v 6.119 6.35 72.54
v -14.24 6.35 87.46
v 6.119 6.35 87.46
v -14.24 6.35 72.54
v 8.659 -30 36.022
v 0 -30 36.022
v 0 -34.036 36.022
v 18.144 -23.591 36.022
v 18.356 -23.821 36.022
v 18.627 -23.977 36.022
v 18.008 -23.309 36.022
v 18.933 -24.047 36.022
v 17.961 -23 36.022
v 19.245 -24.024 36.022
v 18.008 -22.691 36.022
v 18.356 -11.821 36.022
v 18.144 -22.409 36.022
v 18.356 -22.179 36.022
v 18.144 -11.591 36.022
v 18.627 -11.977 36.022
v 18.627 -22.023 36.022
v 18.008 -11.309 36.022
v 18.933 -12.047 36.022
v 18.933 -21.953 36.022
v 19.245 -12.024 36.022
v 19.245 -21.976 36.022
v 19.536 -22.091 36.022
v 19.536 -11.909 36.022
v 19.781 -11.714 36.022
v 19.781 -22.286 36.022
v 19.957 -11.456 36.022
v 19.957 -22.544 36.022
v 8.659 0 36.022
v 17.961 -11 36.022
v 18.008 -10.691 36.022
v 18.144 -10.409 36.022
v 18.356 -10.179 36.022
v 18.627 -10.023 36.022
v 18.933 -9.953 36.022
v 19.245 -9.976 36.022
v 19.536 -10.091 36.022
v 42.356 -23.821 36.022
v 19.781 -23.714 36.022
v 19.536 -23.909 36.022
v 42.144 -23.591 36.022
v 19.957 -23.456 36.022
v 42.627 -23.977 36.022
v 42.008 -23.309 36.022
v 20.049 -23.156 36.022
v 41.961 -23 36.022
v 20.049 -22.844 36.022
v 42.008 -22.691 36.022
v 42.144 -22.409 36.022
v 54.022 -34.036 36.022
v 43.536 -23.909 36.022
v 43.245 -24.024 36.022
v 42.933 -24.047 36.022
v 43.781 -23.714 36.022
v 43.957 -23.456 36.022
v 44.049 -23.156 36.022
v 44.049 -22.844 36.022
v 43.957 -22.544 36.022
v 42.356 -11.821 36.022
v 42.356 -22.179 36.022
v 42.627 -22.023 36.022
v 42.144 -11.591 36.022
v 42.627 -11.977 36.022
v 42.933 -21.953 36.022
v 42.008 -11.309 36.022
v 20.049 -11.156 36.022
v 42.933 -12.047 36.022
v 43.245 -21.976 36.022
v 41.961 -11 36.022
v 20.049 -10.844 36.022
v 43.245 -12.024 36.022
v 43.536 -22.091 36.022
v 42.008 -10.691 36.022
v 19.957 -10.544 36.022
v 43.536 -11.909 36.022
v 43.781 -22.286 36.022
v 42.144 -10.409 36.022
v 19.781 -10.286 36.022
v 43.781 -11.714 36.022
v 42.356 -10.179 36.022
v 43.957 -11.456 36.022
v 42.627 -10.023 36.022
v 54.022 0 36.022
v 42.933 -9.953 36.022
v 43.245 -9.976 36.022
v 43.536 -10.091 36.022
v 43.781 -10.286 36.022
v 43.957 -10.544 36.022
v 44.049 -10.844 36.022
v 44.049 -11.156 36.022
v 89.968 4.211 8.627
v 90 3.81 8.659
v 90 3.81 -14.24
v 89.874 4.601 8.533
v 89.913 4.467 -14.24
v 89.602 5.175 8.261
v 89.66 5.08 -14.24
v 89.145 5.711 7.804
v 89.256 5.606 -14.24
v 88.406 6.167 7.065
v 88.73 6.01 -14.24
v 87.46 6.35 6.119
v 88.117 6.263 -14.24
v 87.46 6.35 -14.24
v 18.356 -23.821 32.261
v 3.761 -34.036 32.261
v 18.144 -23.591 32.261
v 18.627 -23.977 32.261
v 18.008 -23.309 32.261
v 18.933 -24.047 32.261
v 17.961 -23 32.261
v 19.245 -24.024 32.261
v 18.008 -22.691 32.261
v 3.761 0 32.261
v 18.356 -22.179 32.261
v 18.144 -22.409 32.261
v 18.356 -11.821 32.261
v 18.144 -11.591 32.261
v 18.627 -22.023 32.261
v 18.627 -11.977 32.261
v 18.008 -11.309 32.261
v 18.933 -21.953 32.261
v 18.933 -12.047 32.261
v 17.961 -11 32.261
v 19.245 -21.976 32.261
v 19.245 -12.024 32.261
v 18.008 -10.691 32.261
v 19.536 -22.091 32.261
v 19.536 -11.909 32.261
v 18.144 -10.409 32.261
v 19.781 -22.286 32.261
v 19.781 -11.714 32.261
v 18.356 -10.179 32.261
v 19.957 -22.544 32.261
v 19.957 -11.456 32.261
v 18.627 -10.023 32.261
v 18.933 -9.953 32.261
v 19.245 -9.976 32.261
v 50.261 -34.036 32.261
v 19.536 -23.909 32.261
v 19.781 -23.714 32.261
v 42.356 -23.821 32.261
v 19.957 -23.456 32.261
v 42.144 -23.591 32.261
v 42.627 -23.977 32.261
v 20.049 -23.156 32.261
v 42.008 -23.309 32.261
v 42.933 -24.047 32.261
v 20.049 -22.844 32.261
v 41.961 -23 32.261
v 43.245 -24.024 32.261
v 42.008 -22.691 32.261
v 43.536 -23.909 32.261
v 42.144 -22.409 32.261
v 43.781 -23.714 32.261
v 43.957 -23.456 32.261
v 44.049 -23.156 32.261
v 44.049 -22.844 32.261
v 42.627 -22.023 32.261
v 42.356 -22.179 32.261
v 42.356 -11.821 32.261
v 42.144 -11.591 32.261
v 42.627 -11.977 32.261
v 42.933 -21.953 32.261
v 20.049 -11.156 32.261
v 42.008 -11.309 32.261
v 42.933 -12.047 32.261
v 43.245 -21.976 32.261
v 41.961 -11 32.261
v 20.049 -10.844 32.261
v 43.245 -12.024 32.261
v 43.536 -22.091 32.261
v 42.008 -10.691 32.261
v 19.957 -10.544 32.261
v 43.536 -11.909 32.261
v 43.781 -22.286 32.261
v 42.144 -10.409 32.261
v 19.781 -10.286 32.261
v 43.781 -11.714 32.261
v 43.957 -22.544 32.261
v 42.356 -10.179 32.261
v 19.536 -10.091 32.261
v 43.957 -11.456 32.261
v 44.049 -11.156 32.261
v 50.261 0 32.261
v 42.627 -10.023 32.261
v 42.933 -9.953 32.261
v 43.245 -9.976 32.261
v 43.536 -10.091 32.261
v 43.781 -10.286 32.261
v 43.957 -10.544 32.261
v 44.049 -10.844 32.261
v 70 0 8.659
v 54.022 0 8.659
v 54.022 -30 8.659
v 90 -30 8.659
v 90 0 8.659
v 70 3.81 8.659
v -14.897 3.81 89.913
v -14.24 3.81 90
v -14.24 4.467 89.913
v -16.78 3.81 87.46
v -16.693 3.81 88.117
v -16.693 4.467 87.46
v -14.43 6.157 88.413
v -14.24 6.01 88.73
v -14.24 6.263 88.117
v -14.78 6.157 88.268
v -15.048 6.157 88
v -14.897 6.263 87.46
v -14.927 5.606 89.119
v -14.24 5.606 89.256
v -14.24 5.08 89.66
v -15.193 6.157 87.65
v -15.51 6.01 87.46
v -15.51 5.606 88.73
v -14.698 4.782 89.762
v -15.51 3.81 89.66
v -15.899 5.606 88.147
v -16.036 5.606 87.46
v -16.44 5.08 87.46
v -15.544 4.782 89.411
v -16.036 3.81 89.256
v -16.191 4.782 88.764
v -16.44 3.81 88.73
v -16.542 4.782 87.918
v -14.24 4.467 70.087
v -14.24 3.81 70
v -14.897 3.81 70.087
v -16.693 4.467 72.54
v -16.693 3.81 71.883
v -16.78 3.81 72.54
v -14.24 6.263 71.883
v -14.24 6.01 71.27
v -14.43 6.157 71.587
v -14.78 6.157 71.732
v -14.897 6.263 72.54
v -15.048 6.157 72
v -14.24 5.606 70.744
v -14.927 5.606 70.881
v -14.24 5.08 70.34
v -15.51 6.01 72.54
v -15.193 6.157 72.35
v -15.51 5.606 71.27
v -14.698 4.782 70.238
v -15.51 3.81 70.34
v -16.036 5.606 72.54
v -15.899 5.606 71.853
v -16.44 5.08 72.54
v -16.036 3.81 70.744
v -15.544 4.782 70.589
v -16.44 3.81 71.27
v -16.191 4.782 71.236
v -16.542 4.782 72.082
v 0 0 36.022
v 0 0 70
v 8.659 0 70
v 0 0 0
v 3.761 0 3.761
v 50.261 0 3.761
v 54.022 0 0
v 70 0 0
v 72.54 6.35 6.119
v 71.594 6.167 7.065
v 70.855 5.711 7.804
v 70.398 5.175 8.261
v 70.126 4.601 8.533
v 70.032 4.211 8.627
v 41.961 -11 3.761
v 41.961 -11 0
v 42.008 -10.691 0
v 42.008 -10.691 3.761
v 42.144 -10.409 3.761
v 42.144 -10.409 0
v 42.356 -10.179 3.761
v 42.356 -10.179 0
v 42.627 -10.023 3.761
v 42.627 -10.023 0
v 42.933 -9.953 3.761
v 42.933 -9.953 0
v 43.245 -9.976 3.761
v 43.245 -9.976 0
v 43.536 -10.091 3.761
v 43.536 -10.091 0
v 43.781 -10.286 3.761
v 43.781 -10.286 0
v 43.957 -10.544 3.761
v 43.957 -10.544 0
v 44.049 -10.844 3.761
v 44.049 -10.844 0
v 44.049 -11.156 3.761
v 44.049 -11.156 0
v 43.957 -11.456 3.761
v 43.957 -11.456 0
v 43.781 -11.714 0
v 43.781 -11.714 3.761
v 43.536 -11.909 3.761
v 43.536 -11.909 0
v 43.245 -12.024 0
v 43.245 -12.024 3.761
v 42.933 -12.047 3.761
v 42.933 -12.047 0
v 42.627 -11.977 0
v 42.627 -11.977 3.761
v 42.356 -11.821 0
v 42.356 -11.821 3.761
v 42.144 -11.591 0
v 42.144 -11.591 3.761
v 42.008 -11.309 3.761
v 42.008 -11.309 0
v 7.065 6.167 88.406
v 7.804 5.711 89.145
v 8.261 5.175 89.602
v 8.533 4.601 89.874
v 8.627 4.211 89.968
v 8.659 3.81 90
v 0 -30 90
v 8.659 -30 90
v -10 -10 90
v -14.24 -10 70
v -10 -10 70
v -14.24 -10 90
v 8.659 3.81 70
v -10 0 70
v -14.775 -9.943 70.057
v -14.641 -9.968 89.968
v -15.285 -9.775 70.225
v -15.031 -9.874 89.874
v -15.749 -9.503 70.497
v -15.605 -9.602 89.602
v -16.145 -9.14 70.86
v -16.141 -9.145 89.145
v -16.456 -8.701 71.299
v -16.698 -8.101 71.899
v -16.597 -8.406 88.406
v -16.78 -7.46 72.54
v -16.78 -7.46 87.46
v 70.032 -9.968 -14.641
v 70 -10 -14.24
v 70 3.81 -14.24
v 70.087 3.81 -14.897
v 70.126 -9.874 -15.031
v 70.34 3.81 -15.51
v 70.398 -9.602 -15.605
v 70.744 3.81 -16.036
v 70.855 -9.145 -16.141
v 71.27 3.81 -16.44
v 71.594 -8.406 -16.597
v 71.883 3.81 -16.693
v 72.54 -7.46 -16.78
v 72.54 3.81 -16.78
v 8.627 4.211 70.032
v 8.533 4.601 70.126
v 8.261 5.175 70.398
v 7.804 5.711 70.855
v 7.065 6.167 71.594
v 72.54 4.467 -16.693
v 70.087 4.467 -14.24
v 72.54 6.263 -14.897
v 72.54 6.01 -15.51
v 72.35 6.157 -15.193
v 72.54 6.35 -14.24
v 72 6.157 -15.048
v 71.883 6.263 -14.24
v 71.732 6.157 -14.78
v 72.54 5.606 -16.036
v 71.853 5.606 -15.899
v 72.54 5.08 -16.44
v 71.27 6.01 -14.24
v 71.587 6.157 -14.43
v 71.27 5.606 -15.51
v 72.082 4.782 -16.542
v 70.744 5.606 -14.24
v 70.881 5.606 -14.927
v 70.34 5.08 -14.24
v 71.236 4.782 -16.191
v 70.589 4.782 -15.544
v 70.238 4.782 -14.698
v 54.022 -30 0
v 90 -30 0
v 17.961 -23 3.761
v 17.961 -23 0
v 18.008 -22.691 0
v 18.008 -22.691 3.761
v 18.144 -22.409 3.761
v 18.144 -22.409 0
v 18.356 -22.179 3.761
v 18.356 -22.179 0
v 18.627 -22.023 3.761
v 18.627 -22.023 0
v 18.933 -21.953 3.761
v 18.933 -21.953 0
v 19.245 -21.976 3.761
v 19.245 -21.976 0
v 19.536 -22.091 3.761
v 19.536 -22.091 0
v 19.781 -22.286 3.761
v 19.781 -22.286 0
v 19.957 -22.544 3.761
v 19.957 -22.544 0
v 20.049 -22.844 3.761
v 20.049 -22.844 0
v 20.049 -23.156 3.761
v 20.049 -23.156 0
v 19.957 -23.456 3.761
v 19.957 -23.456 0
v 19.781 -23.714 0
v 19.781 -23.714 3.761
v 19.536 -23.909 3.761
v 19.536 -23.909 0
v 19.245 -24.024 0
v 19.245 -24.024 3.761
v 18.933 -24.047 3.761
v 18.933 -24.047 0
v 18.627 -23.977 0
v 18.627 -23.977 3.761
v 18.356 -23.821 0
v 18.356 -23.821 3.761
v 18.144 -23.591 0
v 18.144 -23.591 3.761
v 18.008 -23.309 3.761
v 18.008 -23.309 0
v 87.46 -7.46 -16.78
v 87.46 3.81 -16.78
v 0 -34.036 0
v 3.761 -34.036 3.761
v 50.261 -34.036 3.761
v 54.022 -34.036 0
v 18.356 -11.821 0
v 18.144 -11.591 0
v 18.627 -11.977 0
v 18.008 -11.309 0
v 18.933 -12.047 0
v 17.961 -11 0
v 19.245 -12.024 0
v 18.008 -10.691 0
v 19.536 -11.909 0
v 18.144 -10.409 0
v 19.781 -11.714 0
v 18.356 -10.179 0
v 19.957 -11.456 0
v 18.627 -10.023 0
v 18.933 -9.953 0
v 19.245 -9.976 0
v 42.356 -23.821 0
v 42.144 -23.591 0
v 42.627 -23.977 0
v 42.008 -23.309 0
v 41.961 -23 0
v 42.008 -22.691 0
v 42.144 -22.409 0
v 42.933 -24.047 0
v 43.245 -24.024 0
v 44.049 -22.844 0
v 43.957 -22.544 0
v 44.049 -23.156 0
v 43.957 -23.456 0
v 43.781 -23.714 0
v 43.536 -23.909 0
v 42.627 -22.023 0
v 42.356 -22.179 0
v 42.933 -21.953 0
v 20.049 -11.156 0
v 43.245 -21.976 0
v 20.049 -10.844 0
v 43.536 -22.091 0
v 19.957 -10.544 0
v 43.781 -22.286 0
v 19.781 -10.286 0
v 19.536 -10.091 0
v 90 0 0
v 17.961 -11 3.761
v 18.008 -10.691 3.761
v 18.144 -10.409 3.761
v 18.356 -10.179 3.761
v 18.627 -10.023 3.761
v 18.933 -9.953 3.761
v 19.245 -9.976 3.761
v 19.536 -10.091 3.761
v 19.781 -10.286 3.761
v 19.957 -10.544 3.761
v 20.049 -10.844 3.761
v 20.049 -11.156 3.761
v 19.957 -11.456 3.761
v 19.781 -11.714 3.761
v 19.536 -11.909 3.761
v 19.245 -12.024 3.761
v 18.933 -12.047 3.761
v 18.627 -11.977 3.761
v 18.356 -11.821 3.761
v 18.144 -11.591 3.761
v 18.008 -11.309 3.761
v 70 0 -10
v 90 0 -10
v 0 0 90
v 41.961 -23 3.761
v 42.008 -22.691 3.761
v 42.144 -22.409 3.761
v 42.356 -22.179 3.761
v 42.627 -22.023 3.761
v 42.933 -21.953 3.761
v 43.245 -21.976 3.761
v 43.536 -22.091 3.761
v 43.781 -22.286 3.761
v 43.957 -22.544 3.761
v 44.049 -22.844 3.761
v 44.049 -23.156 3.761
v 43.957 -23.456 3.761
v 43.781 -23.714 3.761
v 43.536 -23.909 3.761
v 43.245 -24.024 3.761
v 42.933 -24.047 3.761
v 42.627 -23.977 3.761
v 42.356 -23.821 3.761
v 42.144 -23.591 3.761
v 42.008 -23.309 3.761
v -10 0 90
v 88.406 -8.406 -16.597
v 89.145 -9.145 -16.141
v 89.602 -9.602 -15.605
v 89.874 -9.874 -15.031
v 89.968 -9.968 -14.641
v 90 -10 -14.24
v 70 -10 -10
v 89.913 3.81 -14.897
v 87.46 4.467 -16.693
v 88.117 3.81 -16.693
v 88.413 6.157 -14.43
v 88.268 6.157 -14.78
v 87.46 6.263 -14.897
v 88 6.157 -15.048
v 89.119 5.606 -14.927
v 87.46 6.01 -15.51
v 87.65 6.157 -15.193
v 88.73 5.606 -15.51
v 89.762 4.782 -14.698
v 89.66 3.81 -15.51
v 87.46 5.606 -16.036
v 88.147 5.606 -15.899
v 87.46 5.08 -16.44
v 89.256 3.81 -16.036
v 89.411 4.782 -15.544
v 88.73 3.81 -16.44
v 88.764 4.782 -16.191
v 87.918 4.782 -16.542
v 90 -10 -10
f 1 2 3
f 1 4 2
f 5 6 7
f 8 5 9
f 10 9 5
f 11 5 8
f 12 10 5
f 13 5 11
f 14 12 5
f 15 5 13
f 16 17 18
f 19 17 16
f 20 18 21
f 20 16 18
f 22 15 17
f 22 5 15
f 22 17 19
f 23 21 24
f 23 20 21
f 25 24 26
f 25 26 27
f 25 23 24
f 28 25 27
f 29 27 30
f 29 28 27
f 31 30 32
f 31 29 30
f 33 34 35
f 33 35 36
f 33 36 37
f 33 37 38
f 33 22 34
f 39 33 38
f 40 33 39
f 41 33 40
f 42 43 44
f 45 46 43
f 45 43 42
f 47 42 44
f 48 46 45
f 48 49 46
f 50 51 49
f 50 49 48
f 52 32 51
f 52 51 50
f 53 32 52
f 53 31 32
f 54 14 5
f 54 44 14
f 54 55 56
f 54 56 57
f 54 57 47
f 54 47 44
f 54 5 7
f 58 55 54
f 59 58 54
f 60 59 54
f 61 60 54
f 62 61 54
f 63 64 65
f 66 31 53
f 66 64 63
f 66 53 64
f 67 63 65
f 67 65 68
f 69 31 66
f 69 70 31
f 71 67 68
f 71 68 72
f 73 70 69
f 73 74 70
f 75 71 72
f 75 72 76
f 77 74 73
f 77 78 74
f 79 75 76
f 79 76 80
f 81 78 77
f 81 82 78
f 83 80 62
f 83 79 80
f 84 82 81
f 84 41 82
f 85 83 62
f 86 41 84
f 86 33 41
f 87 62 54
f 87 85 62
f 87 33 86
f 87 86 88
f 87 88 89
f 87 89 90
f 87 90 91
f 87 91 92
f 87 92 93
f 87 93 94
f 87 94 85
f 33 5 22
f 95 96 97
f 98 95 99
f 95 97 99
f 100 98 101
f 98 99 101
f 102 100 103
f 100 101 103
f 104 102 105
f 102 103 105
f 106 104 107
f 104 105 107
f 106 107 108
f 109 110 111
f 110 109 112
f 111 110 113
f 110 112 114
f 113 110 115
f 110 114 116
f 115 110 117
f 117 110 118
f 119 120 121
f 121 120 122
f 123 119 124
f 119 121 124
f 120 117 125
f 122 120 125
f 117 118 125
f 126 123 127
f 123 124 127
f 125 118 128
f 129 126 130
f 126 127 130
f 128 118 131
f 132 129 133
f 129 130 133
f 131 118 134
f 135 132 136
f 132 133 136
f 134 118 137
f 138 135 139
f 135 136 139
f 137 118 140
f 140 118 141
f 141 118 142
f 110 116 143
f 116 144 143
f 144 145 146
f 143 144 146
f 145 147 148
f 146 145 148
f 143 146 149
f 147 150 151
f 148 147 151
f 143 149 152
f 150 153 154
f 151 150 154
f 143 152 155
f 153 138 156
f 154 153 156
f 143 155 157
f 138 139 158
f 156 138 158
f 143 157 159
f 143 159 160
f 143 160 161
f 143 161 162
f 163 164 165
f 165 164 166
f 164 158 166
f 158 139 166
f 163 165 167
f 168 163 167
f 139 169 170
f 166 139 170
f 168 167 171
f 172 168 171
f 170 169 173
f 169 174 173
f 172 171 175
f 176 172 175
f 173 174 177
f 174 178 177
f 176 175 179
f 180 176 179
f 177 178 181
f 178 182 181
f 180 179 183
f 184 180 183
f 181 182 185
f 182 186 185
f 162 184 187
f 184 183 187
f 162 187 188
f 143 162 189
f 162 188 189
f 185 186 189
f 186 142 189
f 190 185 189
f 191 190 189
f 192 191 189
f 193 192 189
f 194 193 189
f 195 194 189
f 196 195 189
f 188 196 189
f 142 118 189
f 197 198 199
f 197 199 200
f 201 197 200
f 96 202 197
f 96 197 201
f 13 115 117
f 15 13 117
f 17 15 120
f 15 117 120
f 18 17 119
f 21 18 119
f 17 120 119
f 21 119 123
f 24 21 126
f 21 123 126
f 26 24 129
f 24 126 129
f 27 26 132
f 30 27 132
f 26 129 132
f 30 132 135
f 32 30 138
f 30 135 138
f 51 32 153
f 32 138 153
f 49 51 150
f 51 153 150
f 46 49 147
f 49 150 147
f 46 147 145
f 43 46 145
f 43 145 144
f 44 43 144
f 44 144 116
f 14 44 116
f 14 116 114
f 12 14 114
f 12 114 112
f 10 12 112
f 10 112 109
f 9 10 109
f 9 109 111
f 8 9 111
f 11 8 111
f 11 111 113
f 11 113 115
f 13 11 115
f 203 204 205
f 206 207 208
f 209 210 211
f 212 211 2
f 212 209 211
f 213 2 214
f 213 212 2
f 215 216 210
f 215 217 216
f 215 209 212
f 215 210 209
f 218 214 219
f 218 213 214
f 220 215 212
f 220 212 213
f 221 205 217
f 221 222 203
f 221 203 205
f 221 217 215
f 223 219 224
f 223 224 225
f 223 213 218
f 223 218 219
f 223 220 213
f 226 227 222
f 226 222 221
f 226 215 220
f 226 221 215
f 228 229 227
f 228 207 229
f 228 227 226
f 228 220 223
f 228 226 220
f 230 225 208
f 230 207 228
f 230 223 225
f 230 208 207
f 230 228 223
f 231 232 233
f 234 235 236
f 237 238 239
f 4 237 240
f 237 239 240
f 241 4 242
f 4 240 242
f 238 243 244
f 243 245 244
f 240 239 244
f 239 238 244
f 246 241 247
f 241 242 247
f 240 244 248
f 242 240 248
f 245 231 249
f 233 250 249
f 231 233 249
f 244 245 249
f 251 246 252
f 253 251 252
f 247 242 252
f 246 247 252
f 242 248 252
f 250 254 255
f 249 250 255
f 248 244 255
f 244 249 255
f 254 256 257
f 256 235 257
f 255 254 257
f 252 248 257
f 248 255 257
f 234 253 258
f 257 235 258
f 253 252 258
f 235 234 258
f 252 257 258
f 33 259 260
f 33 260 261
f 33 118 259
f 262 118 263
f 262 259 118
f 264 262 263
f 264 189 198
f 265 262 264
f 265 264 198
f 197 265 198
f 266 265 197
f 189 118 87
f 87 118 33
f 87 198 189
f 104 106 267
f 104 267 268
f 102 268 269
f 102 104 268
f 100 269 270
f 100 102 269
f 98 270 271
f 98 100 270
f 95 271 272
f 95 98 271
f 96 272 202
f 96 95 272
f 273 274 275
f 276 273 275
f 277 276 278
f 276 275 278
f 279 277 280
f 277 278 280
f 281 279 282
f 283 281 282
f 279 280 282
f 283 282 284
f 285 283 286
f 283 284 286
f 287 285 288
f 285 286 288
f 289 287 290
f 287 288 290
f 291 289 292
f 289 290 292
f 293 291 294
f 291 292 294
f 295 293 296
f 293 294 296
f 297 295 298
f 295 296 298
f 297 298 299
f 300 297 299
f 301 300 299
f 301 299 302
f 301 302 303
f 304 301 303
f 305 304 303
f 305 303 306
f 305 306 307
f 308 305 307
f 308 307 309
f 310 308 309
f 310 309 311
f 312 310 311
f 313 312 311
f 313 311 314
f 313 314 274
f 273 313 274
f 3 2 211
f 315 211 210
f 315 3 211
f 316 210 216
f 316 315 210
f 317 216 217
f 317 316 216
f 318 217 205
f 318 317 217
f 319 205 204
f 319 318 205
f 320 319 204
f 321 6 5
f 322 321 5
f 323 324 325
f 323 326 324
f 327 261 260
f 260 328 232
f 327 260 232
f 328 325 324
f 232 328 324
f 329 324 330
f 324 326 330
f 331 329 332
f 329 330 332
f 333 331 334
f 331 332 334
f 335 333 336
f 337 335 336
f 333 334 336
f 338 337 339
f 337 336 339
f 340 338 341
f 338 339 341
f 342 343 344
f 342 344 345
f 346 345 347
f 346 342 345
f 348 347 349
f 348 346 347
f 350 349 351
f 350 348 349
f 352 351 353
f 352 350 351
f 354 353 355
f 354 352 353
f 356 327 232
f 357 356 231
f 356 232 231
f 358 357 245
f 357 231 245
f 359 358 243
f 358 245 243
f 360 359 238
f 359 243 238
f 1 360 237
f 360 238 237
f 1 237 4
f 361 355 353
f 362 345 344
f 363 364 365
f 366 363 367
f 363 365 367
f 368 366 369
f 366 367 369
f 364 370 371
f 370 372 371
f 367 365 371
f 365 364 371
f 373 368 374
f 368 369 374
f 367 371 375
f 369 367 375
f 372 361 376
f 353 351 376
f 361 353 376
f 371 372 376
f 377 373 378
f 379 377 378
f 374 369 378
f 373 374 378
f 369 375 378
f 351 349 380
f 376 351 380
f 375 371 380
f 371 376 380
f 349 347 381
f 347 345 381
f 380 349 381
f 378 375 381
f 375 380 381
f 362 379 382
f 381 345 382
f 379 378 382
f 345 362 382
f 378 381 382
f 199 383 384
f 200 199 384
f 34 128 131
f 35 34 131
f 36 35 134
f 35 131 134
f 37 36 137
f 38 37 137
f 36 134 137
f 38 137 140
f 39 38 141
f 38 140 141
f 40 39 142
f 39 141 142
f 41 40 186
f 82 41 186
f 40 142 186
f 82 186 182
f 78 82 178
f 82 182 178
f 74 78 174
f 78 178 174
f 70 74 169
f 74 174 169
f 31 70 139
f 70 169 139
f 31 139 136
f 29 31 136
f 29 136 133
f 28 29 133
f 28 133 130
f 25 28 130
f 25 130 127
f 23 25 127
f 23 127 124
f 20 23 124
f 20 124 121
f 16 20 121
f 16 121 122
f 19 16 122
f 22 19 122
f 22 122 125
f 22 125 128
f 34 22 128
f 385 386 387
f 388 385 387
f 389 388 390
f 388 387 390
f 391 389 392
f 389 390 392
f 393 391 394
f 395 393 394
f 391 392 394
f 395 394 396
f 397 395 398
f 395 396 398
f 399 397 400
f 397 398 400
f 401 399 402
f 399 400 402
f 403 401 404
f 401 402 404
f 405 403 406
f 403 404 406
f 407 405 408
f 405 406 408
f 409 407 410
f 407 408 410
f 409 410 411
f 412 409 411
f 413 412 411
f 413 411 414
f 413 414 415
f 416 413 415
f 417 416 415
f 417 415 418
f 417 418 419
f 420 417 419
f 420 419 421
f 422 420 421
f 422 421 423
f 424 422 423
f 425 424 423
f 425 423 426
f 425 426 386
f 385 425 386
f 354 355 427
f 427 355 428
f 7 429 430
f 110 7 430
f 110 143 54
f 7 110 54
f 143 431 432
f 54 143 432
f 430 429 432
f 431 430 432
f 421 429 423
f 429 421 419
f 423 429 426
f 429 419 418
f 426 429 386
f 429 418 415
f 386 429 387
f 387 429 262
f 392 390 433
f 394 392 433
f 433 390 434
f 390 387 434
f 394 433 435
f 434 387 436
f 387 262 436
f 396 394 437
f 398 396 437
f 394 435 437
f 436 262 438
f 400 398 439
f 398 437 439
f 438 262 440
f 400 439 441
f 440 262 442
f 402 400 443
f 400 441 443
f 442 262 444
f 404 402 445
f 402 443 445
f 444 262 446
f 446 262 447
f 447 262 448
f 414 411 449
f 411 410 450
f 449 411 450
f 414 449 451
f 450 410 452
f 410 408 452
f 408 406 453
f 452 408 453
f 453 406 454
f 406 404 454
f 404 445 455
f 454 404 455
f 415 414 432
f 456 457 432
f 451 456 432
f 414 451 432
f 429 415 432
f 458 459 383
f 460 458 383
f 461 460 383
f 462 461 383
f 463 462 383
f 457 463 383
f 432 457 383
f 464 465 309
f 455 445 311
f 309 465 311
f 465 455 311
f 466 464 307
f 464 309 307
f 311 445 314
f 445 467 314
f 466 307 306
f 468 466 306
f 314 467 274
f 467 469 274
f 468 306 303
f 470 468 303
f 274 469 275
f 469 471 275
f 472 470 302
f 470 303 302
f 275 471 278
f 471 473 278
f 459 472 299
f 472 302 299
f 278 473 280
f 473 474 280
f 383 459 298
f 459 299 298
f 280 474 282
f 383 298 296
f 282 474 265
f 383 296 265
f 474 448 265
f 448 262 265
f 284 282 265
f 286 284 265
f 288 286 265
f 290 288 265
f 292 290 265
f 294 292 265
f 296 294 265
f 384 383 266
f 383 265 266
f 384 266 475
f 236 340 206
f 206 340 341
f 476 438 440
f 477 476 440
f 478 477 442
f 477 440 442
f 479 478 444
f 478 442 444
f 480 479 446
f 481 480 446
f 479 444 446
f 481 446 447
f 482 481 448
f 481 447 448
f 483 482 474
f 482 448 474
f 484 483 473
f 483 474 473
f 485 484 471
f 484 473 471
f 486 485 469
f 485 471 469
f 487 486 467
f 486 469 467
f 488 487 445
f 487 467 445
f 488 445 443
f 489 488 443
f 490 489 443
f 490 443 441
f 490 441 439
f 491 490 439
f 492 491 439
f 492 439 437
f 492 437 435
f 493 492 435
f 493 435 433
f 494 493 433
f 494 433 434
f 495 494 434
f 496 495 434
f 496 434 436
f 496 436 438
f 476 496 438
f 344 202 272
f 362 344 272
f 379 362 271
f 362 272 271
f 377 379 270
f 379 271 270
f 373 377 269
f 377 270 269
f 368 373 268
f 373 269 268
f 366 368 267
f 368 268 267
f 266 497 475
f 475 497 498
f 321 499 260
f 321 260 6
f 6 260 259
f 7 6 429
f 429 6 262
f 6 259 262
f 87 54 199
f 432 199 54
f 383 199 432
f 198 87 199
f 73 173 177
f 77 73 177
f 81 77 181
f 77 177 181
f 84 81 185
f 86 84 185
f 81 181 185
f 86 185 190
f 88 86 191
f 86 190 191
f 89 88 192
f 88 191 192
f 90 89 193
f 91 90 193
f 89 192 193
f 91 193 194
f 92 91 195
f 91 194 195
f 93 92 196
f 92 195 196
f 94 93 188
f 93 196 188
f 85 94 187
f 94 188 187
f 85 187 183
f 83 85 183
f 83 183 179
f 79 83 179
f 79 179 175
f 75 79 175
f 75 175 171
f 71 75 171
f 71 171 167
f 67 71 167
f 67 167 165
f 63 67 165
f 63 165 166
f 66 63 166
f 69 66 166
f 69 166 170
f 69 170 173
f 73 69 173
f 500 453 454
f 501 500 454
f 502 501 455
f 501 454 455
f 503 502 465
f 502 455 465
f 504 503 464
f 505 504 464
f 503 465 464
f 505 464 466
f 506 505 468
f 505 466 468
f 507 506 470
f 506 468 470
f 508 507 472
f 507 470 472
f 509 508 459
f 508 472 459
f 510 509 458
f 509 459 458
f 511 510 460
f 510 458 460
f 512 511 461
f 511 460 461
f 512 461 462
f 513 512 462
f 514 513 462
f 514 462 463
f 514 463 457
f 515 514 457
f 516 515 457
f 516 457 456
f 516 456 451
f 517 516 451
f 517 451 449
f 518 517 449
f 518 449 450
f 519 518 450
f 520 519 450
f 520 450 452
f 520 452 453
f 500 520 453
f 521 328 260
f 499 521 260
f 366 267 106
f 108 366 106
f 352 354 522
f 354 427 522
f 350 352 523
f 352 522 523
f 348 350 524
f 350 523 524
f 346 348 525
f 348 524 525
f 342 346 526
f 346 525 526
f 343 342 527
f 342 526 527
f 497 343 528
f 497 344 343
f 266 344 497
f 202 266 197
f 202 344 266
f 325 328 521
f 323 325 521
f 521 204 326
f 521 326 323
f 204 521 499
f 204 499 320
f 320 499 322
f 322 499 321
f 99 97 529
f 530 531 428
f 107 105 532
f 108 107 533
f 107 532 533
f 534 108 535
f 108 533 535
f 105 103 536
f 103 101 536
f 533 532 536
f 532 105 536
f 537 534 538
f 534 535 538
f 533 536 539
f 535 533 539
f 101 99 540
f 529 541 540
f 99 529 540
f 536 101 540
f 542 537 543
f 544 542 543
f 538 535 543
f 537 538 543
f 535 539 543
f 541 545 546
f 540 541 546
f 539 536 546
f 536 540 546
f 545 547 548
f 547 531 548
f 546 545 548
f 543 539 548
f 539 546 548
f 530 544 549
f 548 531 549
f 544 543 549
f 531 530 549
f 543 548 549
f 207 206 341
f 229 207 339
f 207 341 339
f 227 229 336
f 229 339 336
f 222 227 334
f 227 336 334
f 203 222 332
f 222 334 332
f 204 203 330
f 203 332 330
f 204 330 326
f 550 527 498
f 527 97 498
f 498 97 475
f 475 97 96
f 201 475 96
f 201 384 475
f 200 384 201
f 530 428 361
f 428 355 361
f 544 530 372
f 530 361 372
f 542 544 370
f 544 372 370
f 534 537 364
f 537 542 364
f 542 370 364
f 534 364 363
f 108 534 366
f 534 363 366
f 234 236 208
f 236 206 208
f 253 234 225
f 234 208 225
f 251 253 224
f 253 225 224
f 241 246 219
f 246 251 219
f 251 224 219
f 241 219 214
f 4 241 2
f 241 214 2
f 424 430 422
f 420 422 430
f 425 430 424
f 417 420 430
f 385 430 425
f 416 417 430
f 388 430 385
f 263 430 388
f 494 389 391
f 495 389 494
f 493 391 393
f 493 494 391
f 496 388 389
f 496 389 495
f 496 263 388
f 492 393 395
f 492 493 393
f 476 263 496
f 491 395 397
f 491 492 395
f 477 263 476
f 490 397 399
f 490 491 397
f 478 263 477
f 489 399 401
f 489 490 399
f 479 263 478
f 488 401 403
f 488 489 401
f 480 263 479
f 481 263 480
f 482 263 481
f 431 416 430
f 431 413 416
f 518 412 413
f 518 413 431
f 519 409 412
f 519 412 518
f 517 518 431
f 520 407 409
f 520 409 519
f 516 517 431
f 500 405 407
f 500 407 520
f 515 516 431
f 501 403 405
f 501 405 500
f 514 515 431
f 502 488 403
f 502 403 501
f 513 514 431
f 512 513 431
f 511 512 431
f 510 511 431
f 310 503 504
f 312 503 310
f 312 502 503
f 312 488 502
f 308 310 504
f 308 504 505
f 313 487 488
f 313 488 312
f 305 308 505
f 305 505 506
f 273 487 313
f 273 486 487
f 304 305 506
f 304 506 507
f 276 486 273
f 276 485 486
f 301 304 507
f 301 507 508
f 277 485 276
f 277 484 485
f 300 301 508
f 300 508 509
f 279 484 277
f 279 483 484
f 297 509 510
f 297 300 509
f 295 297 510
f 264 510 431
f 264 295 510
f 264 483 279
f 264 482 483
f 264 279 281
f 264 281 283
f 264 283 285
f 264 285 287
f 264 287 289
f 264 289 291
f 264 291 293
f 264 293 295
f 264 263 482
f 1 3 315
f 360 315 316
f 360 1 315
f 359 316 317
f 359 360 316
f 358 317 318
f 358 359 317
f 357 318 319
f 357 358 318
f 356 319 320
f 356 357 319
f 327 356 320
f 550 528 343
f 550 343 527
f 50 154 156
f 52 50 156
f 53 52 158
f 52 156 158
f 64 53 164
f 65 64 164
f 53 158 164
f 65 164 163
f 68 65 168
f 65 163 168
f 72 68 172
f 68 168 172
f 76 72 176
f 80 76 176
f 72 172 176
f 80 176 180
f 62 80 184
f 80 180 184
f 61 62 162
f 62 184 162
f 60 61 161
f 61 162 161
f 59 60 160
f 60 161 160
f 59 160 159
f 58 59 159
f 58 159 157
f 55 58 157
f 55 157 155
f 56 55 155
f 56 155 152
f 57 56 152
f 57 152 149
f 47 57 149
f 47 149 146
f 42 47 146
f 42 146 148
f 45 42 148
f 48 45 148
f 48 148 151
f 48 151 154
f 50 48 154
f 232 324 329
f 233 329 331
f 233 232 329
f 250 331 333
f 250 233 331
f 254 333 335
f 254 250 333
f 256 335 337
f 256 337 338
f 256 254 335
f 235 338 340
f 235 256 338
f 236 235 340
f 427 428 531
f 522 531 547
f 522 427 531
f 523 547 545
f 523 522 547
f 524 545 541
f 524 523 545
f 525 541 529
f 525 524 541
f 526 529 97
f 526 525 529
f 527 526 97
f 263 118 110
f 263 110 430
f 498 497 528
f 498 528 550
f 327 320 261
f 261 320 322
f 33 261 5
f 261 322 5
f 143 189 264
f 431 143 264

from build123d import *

# Parameters (mm, degrees)
SKETCH2_W           = 54.022158158
SKETCH2_H           = 36.022158158
SKETCH2_W_2         = 46.5
SKETCH2_H_2         = 28.5
BOSS_EXTRUDE1_DEPTH = 34.036
SKETCH3_W           = 8.658958029
SKETCH3_H           = 53.977841842
SKETCH3_W_2         = 35.977841842
SKETCH3_H_2         = 8.658958029
BOSS_EXTRUDE2_DEPTH = 30
BOSS_EXTRUDE3_DEPTH = 6.35
SKETCH5_W           = 20
SKETCH5_H           = 6.78
SKETCH5_W_2         = 6.78
SKETCH5_H_2         = 20
BOSS_EXTRUDE4_DEPTH = 10
FILLET1_R           = 2.54
SKETCH11_R          = 1.049999932
CUT_EXTRUDE1_DEPTH  = 132.751467908


with BuildPart() as part:
    # Sketch2 → Boss-Extrude1 (new body)
    with BuildSketch(Plane(origin=(0, 0, 0), x_dir=(1, 0, 0), z_dir=(0, 1, 0))):
        with Locations((27.011079079, -18.011079079)):
            Rectangle(SKETCH2_W, SKETCH2_H)
        with Locations((27.011079079, -18.011079079)):
            Rectangle(SKETCH2_W_2, SKETCH2_H_2, mode=Mode.SUBTRACT)
    extrude(amount=-BOSS_EXTRUDE1_DEPTH)

    # Sketch3 → Boss-Extrude2 (add)
    with BuildSketch(Plane(origin=(0, 0, 0), x_dir=(1, 0, 0), z_dir=(0, 1, 0))):
        with Locations((4.329479015, -63.011079079)):
            Rectangle(SKETCH3_W, SKETCH3_H)
        with Locations((72.011079079, -4.329479015)):
            Rectangle(SKETCH3_W_2, SKETCH3_H_2)
    extrude(amount=-BOSS_EXTRUDE2_DEPTH)

    # Sketch4 → Boss-Extrude3 (add)
    with BuildSketch(Plane(origin=(0, 0, 0), x_dir=(1, 0, 0), z_dir=(0, 1, 0))):
        Polygon((0, -90), (8.658958029, -90), (8.658958029, -70), (0, -70), (-10, -70), (-16.78, -70), (-16.78, -90), (-10, -90), align=None)
        Polygon((90, -8.658958029), (90, 0), (90, 10), (90, 16.78), (70, 16.78), (70, 10), (70, 0), (70, -8.658958029), align=None)
    extrude(amount=BOSS_EXTRUDE3_DEPTH)

    # Sketch5 → Boss-Extrude4 (add)
    with BuildSketch(Plane.XZ):
        with Locations((80, -13.39)):
            Rectangle(SKETCH5_W, SKETCH5_H)
        with Locations((-13.39, 80)):
            Rectangle(SKETCH5_W_2, SKETCH5_H_2)
    extrude(amount=BOSS_EXTRUDE4_DEPTH)

    # Fillet1
    fillet1_edges = [part.edges().sort_by_distance(p)[0] for p in [
        (80, -10, -16.78),
        (-16.78, -1.825, 70),
        (-16.78, -1.825, 90),
        (-4.060520985, 6.35, 90),
        (8.658958029, 6.35, 80),
        (-4.060520985, 6.35, 70),
        (-16.78, 6.35, 80),
        (90, -1.825, -16.78),
        (70, -1.825, -16.78),
        (80, 6.35, 8.658958029),
        (90, 6.35, -4.060520985),
        (80, 6.35, -16.78),
        (70, 6.35, -4.060520985),
        (-16.78, -10, 80),
    ]]
    fillet(fillet1_edges, radius=FILLET1_R)

    # Sketch11 → Cut-Extrude1 (cut, through all)
    with BuildSketch(Plane(origin=(0, 0, 0), x_dir=(-1, 0, 0), z_dir=(0, 0, -1))):
        with Locations((-19.011079079, -11)):
            Circle(SKETCH11_R)
        with Locations((-19.011079079, -23)):
            Circle(SKETCH11_R)
        with Locations((-43.01107908, -11)):
            Circle(SKETCH11_R)
        with Locations((-43.011079079, -23)):
            Circle(SKETCH11_R)
    extrude(amount=-CUT_EXTRUDE1_DEPTH, mode=Mode.SUBTRACT)


solid = part.part
